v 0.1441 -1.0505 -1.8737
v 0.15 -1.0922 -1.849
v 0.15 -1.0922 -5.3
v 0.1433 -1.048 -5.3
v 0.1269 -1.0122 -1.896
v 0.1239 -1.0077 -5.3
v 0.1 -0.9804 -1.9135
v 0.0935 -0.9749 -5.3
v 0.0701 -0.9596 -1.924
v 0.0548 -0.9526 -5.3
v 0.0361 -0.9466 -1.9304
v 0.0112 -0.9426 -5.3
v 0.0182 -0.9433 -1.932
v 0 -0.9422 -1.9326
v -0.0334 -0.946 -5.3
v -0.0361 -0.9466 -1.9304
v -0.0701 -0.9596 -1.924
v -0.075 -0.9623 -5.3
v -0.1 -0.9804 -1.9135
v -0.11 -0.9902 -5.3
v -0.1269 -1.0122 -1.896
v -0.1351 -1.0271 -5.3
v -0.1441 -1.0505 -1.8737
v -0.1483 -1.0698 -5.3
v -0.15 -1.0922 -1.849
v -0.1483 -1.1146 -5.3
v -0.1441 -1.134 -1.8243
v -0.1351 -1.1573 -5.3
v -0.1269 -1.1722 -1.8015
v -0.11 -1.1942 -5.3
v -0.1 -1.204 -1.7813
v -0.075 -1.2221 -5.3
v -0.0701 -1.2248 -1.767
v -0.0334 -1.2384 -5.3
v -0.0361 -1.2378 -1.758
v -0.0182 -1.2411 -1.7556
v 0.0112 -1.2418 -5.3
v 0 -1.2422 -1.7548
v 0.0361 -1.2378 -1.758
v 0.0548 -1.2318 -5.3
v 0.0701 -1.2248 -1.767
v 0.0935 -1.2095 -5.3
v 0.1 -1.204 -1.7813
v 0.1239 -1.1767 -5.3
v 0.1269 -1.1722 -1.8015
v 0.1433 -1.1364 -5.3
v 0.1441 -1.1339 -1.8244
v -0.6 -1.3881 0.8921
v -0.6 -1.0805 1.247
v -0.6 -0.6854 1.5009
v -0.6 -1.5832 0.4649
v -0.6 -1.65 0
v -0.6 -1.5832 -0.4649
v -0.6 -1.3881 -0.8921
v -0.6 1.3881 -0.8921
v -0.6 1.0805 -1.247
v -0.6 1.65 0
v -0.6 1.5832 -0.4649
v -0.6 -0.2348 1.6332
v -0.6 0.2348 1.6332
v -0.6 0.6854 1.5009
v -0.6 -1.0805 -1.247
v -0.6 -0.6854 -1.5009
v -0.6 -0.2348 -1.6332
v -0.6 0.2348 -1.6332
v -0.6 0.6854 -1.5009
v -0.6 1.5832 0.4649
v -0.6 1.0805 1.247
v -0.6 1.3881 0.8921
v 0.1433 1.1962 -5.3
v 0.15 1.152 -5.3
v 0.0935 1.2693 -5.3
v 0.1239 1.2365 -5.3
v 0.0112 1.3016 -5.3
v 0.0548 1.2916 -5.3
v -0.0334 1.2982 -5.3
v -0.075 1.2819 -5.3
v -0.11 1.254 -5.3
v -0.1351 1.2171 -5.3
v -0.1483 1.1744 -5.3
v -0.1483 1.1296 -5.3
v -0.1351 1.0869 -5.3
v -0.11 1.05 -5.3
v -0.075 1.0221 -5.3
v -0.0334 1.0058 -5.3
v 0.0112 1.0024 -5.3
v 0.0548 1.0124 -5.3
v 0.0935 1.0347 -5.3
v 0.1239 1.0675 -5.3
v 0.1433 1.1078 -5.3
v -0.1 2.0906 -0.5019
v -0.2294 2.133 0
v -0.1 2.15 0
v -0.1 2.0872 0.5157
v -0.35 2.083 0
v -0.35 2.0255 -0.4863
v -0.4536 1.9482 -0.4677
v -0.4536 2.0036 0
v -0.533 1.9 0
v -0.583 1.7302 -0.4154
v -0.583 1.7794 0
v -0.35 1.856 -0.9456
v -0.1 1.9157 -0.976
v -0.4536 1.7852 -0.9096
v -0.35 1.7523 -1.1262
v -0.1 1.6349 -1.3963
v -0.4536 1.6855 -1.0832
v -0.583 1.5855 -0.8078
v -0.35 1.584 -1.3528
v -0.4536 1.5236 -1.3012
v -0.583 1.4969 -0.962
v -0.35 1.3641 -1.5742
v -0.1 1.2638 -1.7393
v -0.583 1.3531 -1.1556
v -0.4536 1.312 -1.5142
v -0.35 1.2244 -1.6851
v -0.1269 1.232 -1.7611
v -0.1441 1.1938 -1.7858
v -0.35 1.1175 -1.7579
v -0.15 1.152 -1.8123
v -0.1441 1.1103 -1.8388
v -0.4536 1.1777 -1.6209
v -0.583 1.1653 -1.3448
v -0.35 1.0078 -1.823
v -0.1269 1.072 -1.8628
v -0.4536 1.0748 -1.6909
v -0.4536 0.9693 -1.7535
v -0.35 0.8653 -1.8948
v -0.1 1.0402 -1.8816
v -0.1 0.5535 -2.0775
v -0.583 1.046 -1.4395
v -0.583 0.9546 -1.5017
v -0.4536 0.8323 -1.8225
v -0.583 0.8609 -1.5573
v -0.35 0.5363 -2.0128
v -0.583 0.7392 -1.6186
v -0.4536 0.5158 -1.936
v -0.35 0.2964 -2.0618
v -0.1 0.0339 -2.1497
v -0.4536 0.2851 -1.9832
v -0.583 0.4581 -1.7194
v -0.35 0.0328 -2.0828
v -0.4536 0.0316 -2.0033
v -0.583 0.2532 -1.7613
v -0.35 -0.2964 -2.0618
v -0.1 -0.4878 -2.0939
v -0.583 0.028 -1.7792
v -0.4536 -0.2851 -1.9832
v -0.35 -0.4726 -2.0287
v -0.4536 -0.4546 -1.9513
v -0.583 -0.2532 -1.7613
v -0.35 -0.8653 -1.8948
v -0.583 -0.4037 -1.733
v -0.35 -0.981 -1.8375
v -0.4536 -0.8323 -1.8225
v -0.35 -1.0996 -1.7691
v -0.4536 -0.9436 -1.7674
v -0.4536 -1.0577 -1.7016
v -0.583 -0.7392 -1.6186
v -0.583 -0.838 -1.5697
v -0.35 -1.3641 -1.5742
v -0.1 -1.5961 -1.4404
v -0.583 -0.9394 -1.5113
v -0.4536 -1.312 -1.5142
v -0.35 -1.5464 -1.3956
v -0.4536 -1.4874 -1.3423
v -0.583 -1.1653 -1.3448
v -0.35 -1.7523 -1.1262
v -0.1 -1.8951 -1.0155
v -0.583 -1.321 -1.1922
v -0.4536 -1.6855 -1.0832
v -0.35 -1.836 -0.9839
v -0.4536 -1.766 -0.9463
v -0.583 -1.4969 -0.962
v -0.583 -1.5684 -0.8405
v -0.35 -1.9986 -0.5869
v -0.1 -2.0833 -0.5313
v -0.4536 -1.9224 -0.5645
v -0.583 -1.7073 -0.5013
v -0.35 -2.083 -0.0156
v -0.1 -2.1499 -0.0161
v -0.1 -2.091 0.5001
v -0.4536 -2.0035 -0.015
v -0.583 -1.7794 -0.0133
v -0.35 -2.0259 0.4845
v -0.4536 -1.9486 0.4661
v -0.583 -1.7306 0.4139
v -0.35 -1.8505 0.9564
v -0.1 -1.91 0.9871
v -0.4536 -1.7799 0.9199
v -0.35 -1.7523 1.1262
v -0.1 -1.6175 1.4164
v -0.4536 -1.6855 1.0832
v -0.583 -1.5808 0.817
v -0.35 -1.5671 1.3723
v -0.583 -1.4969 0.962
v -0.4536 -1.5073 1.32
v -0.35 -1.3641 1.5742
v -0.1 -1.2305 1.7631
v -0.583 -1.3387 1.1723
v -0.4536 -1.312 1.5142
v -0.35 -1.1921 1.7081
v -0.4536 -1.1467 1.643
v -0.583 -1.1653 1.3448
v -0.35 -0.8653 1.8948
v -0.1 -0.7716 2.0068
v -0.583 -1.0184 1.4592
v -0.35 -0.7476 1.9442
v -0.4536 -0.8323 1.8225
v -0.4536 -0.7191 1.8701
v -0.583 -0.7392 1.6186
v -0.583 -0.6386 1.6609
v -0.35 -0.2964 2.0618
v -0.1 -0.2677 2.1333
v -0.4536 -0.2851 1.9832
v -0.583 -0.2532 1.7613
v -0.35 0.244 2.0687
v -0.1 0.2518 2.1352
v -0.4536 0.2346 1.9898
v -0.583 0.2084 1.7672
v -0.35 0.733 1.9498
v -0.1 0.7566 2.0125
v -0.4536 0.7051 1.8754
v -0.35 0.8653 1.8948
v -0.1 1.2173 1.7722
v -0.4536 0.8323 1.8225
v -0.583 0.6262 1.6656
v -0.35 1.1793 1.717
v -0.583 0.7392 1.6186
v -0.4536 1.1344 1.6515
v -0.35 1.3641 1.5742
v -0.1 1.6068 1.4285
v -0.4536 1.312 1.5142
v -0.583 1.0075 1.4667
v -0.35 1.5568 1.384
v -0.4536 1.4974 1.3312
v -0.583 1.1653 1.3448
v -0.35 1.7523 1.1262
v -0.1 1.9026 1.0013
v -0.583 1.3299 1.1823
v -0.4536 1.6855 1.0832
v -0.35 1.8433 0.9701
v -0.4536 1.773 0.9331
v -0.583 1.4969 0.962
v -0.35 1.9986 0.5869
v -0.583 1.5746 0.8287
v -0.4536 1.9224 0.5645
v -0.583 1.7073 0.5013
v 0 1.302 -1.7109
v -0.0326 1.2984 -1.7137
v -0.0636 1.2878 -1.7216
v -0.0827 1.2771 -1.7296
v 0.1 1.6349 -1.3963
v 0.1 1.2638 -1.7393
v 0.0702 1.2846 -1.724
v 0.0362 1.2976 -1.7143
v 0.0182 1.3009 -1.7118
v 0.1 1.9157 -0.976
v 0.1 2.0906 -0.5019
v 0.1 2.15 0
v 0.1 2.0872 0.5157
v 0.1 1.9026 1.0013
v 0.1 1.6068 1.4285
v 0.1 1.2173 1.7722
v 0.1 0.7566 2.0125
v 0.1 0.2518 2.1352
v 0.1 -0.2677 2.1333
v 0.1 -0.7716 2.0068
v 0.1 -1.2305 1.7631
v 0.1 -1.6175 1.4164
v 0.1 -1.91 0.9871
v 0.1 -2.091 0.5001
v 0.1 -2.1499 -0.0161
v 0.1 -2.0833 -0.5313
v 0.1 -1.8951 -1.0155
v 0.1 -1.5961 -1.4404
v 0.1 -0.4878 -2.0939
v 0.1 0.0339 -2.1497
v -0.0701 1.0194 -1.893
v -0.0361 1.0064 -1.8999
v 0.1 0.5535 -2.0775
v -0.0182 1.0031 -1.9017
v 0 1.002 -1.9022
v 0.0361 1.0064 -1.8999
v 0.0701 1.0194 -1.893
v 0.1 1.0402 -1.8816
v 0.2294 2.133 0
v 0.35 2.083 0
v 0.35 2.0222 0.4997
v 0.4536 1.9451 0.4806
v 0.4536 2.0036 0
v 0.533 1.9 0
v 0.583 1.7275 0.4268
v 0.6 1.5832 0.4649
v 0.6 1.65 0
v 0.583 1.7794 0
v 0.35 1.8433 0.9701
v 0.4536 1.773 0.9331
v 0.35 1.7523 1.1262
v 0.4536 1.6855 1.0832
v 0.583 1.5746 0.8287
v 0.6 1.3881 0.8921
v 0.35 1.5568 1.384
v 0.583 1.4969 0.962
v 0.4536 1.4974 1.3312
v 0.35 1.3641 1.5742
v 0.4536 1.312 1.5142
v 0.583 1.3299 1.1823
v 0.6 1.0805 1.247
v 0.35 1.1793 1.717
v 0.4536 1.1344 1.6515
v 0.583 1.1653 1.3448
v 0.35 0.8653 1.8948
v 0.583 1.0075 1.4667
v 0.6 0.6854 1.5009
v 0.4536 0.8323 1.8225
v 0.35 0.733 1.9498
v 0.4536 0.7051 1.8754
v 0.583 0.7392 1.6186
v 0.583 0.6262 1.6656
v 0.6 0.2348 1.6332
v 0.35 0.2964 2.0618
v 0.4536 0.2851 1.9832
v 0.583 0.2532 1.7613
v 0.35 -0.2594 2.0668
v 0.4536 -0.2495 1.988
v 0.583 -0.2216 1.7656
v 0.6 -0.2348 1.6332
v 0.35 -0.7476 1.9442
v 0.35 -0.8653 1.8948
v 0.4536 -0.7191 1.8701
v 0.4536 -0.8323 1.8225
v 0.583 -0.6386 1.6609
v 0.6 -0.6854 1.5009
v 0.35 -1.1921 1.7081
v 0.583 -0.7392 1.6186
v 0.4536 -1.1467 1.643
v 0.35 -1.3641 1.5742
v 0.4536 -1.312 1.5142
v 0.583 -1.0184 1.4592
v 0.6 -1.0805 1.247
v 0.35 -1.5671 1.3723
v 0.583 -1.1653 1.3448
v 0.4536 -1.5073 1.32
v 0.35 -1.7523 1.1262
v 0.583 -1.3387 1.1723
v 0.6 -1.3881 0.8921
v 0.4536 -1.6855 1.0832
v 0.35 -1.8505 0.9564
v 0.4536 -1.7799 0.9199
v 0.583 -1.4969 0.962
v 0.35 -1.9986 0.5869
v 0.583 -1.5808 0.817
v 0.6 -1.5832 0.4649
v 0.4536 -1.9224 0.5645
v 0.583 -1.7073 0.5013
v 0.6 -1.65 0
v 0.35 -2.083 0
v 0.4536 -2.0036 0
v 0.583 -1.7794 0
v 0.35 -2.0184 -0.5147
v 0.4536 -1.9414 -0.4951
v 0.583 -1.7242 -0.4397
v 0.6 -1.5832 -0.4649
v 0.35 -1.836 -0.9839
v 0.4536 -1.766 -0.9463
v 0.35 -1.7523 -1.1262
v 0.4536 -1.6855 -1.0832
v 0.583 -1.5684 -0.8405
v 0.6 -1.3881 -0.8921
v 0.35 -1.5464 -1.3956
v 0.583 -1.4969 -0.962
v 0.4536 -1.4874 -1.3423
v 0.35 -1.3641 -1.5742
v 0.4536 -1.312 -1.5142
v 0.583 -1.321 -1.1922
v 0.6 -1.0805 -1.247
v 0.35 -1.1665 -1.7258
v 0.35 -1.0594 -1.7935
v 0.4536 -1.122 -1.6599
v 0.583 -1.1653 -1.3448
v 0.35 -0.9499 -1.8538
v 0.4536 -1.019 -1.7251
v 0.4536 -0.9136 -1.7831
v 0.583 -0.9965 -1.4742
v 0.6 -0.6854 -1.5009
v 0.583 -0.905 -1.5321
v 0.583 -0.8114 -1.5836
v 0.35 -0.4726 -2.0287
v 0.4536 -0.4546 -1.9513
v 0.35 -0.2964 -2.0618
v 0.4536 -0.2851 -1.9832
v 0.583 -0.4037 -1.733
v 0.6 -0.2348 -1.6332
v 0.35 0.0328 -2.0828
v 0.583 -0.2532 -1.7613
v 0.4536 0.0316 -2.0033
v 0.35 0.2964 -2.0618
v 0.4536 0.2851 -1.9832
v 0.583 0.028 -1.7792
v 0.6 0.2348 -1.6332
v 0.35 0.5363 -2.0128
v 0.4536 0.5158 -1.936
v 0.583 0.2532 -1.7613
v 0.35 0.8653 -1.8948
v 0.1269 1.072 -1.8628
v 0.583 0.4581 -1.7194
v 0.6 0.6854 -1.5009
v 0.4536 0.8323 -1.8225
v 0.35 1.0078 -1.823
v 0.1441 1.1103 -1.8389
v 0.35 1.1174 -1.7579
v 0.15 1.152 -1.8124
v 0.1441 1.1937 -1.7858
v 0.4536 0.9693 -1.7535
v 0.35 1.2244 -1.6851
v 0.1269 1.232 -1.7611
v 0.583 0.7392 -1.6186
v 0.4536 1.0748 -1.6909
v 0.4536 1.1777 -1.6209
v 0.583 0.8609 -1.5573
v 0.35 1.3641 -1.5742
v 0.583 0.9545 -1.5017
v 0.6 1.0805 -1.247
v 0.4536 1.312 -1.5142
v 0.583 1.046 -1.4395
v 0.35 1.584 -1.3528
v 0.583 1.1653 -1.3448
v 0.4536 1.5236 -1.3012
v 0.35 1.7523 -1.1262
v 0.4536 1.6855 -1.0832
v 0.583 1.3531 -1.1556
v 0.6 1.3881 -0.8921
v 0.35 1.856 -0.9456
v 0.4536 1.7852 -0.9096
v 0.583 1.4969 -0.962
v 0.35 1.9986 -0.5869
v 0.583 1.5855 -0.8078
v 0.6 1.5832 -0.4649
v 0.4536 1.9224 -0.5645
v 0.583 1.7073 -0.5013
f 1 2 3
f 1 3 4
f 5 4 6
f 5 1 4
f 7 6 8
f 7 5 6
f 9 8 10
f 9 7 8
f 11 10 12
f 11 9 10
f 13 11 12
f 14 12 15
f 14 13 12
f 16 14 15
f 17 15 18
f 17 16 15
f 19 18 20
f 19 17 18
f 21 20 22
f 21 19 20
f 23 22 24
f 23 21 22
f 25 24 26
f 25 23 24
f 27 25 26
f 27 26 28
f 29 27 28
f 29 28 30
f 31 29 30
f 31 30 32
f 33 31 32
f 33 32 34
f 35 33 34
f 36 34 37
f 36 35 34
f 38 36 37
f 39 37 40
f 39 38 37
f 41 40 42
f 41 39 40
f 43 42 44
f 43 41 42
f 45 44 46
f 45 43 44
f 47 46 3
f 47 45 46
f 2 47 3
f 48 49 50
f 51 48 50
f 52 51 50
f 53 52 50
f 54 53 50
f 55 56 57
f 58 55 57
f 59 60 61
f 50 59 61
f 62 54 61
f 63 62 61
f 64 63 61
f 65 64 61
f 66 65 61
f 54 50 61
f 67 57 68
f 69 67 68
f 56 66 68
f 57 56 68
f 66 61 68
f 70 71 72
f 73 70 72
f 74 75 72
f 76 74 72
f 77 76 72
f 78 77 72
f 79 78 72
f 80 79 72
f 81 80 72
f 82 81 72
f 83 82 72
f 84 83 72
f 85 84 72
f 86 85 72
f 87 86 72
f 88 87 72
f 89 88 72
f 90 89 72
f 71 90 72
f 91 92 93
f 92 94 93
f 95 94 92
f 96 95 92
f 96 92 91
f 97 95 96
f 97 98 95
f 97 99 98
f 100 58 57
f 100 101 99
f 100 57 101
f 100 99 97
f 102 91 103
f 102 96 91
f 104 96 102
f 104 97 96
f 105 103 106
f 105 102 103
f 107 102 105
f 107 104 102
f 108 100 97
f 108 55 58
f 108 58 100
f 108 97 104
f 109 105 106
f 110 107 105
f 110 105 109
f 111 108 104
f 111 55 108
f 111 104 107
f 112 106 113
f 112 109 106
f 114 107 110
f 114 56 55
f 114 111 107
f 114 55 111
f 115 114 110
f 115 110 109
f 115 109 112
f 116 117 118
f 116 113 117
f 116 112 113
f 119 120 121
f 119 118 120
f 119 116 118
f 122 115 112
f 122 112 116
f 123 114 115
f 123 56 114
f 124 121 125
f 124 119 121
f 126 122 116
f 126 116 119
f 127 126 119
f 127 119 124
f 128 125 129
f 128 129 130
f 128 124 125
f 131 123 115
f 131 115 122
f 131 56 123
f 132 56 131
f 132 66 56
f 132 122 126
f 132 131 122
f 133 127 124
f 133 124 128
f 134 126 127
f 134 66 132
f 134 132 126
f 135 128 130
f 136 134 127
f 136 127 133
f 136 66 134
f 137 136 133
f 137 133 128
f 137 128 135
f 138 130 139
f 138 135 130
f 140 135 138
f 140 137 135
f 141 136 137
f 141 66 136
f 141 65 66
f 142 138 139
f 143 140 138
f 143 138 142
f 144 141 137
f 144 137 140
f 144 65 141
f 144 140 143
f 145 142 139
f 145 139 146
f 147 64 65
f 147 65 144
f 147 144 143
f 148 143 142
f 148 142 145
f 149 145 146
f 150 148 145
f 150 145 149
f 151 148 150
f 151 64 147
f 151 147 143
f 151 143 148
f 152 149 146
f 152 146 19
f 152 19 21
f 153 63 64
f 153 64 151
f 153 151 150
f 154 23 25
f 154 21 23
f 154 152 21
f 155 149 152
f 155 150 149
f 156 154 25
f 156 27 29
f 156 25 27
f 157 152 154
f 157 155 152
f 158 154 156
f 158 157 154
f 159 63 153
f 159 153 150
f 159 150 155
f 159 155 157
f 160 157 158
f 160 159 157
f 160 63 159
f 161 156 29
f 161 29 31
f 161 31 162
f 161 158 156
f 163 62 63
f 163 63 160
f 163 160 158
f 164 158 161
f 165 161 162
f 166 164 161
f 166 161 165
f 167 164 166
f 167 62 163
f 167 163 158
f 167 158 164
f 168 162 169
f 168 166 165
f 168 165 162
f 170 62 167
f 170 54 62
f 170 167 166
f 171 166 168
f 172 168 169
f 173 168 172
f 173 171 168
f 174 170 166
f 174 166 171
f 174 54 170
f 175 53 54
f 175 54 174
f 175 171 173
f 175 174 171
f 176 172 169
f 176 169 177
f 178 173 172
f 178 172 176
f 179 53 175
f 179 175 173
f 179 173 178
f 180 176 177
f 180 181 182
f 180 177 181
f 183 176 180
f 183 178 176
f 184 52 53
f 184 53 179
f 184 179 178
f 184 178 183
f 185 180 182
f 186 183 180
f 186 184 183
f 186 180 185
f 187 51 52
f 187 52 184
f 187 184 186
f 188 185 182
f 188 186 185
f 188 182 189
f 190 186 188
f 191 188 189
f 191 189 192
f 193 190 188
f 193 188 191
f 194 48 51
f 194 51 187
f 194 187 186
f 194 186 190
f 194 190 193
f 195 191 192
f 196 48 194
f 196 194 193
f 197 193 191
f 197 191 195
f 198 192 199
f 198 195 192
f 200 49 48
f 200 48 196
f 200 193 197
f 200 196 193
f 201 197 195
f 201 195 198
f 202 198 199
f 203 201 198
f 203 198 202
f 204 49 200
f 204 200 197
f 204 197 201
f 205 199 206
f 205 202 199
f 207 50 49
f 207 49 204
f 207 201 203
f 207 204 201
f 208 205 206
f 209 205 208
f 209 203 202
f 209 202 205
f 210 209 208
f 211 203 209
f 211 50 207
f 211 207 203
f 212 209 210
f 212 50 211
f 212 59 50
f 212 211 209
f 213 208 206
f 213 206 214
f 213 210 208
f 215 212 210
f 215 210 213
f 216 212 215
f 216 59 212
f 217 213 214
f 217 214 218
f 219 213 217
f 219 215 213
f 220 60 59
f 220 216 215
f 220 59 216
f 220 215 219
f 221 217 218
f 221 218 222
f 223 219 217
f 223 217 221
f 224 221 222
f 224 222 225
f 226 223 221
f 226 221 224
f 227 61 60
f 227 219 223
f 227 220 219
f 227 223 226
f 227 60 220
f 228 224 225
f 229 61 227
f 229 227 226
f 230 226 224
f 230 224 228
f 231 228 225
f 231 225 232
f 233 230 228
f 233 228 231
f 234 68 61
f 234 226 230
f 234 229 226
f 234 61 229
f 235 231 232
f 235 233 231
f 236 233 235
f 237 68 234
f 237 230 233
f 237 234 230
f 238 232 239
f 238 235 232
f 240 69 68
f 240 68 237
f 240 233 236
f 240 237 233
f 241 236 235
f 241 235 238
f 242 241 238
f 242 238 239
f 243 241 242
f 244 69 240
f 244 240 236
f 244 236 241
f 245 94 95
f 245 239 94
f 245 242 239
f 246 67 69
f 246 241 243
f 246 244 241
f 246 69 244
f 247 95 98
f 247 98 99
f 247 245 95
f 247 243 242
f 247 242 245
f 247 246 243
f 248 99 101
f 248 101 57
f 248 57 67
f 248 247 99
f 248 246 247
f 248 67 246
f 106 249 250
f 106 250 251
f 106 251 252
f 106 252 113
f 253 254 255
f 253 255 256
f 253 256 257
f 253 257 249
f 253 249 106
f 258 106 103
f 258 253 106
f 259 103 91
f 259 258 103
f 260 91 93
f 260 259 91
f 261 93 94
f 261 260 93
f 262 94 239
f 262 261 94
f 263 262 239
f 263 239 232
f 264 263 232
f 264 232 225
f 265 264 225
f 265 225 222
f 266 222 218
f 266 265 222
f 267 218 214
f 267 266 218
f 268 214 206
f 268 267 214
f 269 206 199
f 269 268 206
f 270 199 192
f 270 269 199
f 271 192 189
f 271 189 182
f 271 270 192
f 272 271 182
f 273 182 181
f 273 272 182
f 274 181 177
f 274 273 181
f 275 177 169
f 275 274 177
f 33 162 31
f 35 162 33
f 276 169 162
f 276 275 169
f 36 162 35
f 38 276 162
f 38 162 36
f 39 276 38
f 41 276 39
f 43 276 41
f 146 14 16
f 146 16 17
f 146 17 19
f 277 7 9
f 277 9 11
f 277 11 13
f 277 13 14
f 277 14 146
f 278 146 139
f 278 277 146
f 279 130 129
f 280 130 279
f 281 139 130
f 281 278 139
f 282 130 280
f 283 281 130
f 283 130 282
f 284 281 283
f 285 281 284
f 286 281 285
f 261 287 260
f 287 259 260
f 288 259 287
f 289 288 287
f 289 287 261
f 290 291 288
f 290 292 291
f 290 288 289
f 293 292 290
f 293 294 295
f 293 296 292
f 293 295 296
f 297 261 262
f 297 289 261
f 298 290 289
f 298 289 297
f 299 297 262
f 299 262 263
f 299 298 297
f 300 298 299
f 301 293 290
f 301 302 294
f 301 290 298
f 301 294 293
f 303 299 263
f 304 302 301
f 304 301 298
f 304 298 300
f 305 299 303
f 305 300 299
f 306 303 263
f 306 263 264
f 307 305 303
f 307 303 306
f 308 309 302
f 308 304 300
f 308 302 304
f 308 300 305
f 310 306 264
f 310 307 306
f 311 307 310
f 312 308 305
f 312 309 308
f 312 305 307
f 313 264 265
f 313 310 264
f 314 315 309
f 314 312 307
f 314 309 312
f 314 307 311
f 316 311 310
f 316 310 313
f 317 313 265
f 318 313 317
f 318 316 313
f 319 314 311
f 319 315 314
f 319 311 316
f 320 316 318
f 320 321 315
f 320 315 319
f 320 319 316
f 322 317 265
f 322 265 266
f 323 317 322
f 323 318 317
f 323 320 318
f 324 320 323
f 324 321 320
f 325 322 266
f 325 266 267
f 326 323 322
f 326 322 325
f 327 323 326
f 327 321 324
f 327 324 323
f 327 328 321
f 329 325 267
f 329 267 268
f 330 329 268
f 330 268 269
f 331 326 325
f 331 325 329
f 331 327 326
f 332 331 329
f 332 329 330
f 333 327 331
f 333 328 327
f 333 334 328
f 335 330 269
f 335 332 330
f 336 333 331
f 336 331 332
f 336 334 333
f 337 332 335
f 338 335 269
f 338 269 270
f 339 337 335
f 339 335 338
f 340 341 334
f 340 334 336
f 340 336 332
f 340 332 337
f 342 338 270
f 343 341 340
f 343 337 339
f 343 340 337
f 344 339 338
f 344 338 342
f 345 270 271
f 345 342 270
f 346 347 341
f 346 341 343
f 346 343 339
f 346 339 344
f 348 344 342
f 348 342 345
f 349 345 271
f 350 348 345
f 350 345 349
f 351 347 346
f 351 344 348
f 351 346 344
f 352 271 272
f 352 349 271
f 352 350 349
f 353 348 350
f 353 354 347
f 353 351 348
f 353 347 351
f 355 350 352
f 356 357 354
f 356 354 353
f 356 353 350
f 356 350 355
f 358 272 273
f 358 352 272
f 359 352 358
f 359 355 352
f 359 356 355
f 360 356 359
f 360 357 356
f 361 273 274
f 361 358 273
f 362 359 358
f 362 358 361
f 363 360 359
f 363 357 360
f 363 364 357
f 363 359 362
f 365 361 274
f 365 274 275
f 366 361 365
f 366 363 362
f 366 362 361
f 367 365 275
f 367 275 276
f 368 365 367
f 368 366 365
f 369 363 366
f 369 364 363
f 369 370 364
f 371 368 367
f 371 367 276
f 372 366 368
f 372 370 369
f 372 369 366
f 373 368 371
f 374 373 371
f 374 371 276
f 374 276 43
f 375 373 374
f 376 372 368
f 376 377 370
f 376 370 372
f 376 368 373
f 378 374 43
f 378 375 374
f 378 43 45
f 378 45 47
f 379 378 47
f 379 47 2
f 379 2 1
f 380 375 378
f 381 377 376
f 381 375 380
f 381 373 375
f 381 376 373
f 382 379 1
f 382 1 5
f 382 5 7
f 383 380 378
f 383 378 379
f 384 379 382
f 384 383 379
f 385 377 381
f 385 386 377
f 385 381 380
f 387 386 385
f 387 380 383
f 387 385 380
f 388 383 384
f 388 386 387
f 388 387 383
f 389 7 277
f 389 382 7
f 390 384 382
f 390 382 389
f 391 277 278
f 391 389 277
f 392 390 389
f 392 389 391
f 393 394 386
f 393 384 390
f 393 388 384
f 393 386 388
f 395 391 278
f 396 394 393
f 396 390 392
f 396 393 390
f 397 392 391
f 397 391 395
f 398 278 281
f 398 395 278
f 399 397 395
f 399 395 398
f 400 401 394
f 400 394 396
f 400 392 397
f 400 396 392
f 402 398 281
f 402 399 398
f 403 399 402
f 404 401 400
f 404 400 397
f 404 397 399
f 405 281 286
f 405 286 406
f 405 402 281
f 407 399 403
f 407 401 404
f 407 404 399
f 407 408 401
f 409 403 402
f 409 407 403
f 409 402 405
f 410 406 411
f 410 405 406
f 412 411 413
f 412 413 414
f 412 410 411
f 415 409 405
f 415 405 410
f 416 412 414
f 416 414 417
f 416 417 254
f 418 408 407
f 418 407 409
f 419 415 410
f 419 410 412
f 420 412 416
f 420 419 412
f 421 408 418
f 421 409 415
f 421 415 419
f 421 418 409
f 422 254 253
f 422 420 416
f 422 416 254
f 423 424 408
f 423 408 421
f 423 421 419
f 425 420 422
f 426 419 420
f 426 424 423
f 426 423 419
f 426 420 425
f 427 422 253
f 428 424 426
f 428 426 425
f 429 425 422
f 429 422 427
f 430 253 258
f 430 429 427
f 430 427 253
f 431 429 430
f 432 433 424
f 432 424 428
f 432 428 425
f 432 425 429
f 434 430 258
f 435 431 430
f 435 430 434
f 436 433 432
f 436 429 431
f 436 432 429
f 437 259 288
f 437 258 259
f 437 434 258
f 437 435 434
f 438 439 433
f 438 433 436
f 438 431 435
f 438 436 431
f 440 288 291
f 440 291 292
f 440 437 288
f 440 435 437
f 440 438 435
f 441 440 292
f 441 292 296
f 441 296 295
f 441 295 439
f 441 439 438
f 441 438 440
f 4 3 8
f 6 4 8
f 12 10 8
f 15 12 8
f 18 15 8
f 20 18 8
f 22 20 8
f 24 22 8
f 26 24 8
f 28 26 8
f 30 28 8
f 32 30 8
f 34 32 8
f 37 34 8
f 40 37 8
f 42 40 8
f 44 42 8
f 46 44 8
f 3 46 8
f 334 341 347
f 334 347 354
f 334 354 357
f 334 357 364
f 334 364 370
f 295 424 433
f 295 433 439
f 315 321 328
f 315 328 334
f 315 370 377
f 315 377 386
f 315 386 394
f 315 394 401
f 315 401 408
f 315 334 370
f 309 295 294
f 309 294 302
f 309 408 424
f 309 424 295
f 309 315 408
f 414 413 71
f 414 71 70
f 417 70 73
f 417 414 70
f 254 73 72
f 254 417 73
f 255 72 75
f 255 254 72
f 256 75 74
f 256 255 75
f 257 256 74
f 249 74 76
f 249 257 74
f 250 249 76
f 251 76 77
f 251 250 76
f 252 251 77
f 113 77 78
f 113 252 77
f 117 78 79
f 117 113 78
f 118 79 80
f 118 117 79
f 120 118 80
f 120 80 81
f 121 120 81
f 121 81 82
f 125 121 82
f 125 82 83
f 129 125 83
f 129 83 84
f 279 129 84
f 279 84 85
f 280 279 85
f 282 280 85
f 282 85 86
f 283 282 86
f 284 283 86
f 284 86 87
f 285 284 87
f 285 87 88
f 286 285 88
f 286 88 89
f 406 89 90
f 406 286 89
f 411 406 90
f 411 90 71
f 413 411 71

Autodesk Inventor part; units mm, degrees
ref_plane "YZ Plane" through (0, 0, 0) normal (1, 0, 0) x (0, 1, 0)
ref_plane "XZ Plane" through (0, 0, 0) normal (0, 1, 0) x (-1, 0, 0)
sketch "Boceto1" plane through (0, 0, 0) normal (1, 0, 0) x (0, 1, 0)
  circle A0 centre (0, 0) radius 2.15
  dimension "d0" = 4.3
extrude "Extrusión1" add sketch "Boceto1" along normal mid plane 1.2
fillet "Empalme1" radius 0.5 1 edges at (0.6, -2.15, 0)
fillet "Empalme2" radius 0.5 1 edges at (-0.6, -2.15, 0)
sketch "Boceto2" plane through (-0.6, 0, 0) normal (-1, 0, 0) x (0, 0, 1)
  line L0 (-0.4973, -1.1141) -> (-0.471, 1.1369) construction
  line L1 (-0.471, 1.1369) -> (0.5703, 1.1247) construction
  line L2 (0.5703, 1.1247) -> (0.544, -1.1263) construction
  line L3 (0.544, -1.1263) -> (-0.4973, -1.1141) construction
  line L4 (-0.4973, -1.1141) -> (-0.471, 1.1369) construction
  line L5 (-0.471, 1.1369) -> (0.5703, 1.1247) construction
  line L6 (0.5703, 1.1247) -> (0.544, -1.1263) construction
  line L7 (0.544, -1.1263) -> (-0.4973, -1.1141) construction
  line L8 (-0.4973, -1.1141) -> (-0.471, 1.1369) construction
  line L9 (-0.471, 1.1369) -> (0.5703, 1.1247) construction
  line L10 (0.5703, 1.1247) -> (0.544, -1.1263) construction
  line L11 (0.544, -1.1263) -> (-0.4973, -1.1141) construction
  line L12 (-0.4973, -1.1141) -> (-0.471, 1.1369) construction
  line L13 (-0.471, 1.1369) -> (0.5703, 1.1247) construction
  line L14 (0.5703, 1.1247) -> (0.544, -1.1263) construction
  line L15 (0.544, -1.1263) -> (-0.4973, -1.1141) construction
  line L16 (0.5613, 1.1178) -> (0.5386, -1.1333) construction
  line L17 (0.5386, -1.1333) -> (-0.5027, -1.1227) construction
  line L18 (-0.5027, -1.1227) -> (-0.4799, 1.1284) construction
  line L19 (-0.4799, 1.1284) -> (0.5613, 1.1178) construction
  point P0 (0, 0)
sketch "Boceto3" plane through (0.6, 0, 0) normal (1, 0, 0) x (0, 0, -1)
  line L0 (-0.4973, -1.1141) -> (-0.471, 1.1369) construction
  line L1 (-0.471, 1.1369) -> (0.5703, 1.1247) construction
  line L2 (0.5703, 1.1247) -> (0.544, -1.1263) construction
  line L3 (0.544, -1.1263) -> (-0.4973, -1.1141) construction
  point P0 (0, 0)
ref_plane "Plano de trabajo1" through (0, 0, -1.3) normal (0, 0, 1) x (1, 0, 0)
sketch "Boceto4" plane through (0, 0, -1.3) normal (0, 0, 1) x (1, 0, 0)
  line L0 (0.1, -2.15) -> (0.1, 2.15) projected
  line L1 (0.6, 1.65) -> (0.6, -1.65) projected
  line L2 (-0.1, 2.15) -> (-0.1, -2.15) projected
  line L3 (-0.6, -1.65) -> (-0.6, 1.65) projected
  line L4 (0.1, -2.15) -> (0.1, 2.15) projected
  line L5 (-0.1, 2.15) -> (-0.1, -2.15) projected
  circle A0 centre (0, -1.0922) radius 0.15
  circle A1 centre (0, 1.152) radius 0.15
  point P0 (0, 0)
  dimension "d7" = 0.3
  dimension "d8" = 0.3
extrude "Extrusión2" add sketch "Boceto4" against normal blind 4 contours A0 L2 L0 | L0 A0 | A0 L2 | A1 L2 L0 | L0 A1 | A1 L2
properties part number "cap334"
